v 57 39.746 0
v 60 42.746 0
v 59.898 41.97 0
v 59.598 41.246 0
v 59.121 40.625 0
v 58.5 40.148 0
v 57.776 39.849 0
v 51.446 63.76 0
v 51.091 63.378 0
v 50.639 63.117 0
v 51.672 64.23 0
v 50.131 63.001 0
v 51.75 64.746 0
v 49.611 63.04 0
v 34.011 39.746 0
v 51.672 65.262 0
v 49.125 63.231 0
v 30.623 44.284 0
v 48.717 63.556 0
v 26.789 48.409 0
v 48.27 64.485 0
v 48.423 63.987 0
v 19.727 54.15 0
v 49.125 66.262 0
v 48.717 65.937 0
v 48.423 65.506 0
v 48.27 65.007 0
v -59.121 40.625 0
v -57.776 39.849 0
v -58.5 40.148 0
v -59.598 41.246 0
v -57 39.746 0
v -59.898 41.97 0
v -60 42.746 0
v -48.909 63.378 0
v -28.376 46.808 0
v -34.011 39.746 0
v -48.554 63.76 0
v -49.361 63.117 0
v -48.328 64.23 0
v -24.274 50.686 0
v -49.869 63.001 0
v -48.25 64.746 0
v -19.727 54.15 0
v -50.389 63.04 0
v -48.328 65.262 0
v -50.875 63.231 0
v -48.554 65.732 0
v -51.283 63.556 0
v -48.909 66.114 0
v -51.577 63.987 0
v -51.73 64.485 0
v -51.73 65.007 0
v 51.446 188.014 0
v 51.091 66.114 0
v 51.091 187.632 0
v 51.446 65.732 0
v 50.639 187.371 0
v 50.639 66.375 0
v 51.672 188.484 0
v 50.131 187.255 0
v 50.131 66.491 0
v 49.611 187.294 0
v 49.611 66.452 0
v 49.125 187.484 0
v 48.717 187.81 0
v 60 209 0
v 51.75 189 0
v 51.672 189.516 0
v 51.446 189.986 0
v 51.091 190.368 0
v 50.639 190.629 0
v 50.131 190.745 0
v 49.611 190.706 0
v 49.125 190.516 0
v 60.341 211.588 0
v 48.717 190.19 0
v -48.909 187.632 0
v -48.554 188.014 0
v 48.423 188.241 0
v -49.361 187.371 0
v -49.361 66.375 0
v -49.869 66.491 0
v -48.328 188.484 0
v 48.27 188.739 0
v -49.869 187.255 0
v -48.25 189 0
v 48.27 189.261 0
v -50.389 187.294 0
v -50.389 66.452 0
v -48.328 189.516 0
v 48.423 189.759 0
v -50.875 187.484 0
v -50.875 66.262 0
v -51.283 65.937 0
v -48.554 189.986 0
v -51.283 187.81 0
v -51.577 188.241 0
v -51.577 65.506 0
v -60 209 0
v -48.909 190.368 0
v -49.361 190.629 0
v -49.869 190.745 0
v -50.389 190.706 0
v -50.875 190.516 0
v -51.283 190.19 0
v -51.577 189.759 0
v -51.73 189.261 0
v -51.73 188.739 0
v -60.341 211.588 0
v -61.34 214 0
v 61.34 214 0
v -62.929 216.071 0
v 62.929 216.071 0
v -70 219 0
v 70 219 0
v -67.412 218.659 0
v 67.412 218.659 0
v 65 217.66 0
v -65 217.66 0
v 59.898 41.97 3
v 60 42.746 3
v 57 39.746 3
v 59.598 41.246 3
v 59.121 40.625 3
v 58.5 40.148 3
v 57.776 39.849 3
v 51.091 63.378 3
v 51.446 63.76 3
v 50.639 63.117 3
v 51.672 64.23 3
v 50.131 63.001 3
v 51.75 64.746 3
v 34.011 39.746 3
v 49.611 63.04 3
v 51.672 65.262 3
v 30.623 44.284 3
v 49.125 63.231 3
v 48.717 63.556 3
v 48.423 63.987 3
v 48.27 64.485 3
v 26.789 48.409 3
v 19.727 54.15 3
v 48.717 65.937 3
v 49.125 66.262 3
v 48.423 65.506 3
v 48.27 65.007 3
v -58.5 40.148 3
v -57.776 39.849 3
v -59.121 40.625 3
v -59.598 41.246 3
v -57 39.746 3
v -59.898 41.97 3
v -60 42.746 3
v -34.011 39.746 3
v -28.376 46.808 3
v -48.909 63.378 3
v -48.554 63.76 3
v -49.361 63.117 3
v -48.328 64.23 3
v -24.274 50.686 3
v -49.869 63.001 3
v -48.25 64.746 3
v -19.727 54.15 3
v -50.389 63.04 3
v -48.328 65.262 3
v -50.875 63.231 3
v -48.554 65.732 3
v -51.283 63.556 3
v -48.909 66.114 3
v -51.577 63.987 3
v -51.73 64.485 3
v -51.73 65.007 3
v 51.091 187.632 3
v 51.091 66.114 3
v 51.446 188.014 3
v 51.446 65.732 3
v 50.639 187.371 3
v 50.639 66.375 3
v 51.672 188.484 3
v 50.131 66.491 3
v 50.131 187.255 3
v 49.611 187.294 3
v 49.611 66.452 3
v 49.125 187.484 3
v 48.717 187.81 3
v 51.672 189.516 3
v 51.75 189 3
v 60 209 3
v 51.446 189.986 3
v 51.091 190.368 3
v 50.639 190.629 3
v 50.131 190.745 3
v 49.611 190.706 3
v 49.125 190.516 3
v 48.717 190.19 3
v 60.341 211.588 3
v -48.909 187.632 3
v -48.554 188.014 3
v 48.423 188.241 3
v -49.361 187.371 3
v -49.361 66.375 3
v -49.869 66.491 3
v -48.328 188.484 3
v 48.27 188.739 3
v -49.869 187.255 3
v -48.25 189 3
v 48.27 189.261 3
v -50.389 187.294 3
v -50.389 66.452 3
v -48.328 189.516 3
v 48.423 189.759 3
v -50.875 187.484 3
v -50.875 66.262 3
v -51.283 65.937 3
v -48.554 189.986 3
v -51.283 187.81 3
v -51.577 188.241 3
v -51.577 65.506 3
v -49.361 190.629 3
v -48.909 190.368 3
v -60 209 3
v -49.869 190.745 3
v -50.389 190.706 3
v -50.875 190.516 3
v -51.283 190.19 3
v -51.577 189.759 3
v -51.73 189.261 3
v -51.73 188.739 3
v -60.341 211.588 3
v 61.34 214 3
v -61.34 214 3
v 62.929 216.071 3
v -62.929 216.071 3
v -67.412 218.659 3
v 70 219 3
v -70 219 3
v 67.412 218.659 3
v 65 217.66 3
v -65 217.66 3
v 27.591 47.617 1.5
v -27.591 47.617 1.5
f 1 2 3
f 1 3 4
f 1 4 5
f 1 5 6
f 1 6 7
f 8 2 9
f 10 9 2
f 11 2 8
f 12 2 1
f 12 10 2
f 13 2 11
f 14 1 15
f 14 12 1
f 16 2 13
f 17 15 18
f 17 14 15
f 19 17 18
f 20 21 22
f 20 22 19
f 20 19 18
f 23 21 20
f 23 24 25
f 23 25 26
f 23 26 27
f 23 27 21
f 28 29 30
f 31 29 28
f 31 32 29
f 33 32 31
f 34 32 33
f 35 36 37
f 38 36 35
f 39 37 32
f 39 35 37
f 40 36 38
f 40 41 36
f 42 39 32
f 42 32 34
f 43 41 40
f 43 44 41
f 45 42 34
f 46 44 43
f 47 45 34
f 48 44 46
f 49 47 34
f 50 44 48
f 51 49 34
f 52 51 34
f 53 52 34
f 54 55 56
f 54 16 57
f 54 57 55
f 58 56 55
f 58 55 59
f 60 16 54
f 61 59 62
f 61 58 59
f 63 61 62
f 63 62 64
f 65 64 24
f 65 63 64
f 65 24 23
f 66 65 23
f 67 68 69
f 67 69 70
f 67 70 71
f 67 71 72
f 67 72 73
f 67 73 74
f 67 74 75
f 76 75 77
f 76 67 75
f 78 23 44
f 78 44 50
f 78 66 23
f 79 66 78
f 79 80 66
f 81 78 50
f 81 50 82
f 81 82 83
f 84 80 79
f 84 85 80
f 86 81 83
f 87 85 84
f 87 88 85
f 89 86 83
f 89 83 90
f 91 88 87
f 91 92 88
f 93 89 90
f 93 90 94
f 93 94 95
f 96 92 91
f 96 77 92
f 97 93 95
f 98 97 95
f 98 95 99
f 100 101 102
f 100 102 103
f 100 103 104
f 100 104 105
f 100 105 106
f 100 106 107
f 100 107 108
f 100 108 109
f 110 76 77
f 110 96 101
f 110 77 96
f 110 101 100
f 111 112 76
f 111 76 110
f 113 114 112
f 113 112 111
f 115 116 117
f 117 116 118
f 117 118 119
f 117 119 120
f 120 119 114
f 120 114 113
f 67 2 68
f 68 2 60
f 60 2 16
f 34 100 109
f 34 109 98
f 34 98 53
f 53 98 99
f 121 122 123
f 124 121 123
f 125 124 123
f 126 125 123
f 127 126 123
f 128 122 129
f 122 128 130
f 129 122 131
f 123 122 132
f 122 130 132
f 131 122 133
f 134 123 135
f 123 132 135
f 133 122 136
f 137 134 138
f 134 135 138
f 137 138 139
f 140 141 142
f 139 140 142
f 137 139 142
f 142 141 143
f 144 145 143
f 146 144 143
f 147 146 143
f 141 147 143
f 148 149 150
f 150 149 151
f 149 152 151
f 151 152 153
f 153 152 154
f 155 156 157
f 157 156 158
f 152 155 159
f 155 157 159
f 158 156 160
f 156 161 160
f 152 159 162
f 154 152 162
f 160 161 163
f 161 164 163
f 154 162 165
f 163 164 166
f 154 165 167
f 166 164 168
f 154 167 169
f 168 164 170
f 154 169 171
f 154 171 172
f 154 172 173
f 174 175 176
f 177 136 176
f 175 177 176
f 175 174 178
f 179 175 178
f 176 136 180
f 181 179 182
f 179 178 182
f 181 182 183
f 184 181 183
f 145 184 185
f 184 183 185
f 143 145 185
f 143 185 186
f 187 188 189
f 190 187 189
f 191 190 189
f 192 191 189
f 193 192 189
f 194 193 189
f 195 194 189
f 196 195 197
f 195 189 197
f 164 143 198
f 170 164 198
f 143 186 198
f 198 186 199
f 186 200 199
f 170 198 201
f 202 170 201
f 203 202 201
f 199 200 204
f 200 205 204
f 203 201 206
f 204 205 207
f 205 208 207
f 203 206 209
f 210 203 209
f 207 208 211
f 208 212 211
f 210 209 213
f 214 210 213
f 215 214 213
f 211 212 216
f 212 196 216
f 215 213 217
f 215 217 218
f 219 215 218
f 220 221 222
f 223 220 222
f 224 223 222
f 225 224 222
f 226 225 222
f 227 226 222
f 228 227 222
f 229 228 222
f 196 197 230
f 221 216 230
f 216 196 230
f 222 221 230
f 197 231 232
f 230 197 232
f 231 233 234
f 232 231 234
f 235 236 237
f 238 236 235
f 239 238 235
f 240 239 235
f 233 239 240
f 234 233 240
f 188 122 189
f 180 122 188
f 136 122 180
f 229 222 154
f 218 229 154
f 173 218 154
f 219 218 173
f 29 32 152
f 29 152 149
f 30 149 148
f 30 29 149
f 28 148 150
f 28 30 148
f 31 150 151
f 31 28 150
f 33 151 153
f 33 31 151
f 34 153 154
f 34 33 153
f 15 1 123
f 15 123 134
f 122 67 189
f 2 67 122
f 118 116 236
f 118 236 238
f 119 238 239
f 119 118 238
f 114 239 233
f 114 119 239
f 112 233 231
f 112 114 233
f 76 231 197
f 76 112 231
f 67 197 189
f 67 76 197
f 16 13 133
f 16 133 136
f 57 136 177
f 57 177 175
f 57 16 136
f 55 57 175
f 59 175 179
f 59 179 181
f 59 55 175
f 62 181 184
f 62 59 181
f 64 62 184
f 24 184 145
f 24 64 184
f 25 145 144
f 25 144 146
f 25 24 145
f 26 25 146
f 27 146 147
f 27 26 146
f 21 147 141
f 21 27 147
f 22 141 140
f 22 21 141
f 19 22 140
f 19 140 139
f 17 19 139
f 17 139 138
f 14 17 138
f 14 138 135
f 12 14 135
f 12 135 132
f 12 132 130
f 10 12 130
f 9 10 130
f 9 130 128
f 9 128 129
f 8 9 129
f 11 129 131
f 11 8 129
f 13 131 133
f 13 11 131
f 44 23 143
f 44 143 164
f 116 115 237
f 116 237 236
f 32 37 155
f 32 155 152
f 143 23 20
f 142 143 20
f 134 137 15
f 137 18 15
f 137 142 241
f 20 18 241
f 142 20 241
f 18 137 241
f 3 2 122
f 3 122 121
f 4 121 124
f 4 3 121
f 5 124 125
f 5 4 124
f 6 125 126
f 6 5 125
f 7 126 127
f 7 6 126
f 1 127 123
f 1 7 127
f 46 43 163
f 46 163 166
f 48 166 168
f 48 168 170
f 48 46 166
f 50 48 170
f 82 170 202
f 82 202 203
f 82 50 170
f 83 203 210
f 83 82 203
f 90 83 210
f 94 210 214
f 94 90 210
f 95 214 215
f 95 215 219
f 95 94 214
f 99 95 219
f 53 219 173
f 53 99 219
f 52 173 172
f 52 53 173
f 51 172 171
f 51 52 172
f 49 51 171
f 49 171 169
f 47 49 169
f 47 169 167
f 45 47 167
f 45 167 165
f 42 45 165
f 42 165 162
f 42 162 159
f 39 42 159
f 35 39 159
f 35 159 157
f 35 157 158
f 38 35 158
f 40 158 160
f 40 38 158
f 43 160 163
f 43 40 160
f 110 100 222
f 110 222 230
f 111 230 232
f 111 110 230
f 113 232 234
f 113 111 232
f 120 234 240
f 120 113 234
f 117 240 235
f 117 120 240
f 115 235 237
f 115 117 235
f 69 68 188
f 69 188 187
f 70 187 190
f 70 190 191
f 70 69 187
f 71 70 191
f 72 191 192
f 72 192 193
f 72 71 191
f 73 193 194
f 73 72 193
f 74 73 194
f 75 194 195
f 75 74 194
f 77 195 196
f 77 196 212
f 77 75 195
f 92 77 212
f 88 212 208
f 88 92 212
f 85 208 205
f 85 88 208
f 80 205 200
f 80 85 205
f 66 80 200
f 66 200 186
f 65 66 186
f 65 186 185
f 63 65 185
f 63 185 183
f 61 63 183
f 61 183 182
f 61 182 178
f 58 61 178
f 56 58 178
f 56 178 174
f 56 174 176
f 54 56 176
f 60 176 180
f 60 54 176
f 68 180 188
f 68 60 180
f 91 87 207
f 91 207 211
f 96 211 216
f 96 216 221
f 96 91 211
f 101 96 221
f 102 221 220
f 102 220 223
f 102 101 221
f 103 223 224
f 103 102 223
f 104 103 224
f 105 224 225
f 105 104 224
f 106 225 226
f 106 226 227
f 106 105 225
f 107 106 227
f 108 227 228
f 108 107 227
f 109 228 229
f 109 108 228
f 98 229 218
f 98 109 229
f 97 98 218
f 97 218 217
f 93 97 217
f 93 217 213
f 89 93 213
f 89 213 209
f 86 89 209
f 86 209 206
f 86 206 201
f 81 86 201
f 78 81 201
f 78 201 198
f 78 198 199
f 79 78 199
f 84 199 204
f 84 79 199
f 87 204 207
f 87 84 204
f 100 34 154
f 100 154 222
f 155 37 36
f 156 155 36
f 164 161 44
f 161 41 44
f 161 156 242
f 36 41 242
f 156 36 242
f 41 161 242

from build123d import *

# Parameters (mm, degrees)
SKETCH1_R           = 1.75
BOSS_EXTRUDE1_DEPTH = 3


with BuildPart() as part:
    # Sketch1 → Boss-Extrude1 (new body)
    with BuildSketch(Plane.XY):
        with BuildLine():
            Line((-70, 219), (70, 219))
            ThreePointArc((70, 219), (62.928932188, 216.071067812), (60, 209))
            Line((60, 209), (60, 42.746292529))
            ThreePointArc((60, 42.746292529), (59.121320344, 40.624972186), (57, 39.746292529))
            Line((57, 39.746292529), (34.010726171, 39.746292529))
            add(Edge.make_bspline(
                [(19.726580418, 54.15), (28.313482158, 48.285383086), (34.010726171, 39.746292529)],
                knots=[0, 0, 0, 1, 1, 1], degree=2))
            Line((19.726580418, 54.15), (-19.726580418, 54.15))
            add(Edge.make_bspline(
                [(-34.01072617, 39.746292529), (-28.313482158, 48.285383086), (-19.726580418, 54.15)],
                knots=[0, 0, 0, 1, 1, 1], degree=2))
            Line((-34.01072617, 39.746292529), (-57, 39.746292529))
            ThreePointArc((-57, 39.746292529), (-59.121320344, 40.624972186), (-60, 42.746292529))
            Line((-60, 42.746292529), (-60, 209))
            ThreePointArc((-60, 209), (-62.928932188, 216.071067812), (-70, 219))
        make_face()
        with Locations((50, 64.746292529)):
            Circle(SKETCH1_R, mode=Mode.SUBTRACT)
        with Locations((50, 189)):
            Circle(SKETCH1_R, mode=Mode.SUBTRACT)
        with Locations((-50, 189)):
            Circle(SKETCH1_R, mode=Mode.SUBTRACT)
        with Locations((-50, 64.746292529)):
            Circle(SKETCH1_R, mode=Mode.SUBTRACT)
    extrude(amount=BOSS_EXTRUDE1_DEPTH)


solid = part.part
